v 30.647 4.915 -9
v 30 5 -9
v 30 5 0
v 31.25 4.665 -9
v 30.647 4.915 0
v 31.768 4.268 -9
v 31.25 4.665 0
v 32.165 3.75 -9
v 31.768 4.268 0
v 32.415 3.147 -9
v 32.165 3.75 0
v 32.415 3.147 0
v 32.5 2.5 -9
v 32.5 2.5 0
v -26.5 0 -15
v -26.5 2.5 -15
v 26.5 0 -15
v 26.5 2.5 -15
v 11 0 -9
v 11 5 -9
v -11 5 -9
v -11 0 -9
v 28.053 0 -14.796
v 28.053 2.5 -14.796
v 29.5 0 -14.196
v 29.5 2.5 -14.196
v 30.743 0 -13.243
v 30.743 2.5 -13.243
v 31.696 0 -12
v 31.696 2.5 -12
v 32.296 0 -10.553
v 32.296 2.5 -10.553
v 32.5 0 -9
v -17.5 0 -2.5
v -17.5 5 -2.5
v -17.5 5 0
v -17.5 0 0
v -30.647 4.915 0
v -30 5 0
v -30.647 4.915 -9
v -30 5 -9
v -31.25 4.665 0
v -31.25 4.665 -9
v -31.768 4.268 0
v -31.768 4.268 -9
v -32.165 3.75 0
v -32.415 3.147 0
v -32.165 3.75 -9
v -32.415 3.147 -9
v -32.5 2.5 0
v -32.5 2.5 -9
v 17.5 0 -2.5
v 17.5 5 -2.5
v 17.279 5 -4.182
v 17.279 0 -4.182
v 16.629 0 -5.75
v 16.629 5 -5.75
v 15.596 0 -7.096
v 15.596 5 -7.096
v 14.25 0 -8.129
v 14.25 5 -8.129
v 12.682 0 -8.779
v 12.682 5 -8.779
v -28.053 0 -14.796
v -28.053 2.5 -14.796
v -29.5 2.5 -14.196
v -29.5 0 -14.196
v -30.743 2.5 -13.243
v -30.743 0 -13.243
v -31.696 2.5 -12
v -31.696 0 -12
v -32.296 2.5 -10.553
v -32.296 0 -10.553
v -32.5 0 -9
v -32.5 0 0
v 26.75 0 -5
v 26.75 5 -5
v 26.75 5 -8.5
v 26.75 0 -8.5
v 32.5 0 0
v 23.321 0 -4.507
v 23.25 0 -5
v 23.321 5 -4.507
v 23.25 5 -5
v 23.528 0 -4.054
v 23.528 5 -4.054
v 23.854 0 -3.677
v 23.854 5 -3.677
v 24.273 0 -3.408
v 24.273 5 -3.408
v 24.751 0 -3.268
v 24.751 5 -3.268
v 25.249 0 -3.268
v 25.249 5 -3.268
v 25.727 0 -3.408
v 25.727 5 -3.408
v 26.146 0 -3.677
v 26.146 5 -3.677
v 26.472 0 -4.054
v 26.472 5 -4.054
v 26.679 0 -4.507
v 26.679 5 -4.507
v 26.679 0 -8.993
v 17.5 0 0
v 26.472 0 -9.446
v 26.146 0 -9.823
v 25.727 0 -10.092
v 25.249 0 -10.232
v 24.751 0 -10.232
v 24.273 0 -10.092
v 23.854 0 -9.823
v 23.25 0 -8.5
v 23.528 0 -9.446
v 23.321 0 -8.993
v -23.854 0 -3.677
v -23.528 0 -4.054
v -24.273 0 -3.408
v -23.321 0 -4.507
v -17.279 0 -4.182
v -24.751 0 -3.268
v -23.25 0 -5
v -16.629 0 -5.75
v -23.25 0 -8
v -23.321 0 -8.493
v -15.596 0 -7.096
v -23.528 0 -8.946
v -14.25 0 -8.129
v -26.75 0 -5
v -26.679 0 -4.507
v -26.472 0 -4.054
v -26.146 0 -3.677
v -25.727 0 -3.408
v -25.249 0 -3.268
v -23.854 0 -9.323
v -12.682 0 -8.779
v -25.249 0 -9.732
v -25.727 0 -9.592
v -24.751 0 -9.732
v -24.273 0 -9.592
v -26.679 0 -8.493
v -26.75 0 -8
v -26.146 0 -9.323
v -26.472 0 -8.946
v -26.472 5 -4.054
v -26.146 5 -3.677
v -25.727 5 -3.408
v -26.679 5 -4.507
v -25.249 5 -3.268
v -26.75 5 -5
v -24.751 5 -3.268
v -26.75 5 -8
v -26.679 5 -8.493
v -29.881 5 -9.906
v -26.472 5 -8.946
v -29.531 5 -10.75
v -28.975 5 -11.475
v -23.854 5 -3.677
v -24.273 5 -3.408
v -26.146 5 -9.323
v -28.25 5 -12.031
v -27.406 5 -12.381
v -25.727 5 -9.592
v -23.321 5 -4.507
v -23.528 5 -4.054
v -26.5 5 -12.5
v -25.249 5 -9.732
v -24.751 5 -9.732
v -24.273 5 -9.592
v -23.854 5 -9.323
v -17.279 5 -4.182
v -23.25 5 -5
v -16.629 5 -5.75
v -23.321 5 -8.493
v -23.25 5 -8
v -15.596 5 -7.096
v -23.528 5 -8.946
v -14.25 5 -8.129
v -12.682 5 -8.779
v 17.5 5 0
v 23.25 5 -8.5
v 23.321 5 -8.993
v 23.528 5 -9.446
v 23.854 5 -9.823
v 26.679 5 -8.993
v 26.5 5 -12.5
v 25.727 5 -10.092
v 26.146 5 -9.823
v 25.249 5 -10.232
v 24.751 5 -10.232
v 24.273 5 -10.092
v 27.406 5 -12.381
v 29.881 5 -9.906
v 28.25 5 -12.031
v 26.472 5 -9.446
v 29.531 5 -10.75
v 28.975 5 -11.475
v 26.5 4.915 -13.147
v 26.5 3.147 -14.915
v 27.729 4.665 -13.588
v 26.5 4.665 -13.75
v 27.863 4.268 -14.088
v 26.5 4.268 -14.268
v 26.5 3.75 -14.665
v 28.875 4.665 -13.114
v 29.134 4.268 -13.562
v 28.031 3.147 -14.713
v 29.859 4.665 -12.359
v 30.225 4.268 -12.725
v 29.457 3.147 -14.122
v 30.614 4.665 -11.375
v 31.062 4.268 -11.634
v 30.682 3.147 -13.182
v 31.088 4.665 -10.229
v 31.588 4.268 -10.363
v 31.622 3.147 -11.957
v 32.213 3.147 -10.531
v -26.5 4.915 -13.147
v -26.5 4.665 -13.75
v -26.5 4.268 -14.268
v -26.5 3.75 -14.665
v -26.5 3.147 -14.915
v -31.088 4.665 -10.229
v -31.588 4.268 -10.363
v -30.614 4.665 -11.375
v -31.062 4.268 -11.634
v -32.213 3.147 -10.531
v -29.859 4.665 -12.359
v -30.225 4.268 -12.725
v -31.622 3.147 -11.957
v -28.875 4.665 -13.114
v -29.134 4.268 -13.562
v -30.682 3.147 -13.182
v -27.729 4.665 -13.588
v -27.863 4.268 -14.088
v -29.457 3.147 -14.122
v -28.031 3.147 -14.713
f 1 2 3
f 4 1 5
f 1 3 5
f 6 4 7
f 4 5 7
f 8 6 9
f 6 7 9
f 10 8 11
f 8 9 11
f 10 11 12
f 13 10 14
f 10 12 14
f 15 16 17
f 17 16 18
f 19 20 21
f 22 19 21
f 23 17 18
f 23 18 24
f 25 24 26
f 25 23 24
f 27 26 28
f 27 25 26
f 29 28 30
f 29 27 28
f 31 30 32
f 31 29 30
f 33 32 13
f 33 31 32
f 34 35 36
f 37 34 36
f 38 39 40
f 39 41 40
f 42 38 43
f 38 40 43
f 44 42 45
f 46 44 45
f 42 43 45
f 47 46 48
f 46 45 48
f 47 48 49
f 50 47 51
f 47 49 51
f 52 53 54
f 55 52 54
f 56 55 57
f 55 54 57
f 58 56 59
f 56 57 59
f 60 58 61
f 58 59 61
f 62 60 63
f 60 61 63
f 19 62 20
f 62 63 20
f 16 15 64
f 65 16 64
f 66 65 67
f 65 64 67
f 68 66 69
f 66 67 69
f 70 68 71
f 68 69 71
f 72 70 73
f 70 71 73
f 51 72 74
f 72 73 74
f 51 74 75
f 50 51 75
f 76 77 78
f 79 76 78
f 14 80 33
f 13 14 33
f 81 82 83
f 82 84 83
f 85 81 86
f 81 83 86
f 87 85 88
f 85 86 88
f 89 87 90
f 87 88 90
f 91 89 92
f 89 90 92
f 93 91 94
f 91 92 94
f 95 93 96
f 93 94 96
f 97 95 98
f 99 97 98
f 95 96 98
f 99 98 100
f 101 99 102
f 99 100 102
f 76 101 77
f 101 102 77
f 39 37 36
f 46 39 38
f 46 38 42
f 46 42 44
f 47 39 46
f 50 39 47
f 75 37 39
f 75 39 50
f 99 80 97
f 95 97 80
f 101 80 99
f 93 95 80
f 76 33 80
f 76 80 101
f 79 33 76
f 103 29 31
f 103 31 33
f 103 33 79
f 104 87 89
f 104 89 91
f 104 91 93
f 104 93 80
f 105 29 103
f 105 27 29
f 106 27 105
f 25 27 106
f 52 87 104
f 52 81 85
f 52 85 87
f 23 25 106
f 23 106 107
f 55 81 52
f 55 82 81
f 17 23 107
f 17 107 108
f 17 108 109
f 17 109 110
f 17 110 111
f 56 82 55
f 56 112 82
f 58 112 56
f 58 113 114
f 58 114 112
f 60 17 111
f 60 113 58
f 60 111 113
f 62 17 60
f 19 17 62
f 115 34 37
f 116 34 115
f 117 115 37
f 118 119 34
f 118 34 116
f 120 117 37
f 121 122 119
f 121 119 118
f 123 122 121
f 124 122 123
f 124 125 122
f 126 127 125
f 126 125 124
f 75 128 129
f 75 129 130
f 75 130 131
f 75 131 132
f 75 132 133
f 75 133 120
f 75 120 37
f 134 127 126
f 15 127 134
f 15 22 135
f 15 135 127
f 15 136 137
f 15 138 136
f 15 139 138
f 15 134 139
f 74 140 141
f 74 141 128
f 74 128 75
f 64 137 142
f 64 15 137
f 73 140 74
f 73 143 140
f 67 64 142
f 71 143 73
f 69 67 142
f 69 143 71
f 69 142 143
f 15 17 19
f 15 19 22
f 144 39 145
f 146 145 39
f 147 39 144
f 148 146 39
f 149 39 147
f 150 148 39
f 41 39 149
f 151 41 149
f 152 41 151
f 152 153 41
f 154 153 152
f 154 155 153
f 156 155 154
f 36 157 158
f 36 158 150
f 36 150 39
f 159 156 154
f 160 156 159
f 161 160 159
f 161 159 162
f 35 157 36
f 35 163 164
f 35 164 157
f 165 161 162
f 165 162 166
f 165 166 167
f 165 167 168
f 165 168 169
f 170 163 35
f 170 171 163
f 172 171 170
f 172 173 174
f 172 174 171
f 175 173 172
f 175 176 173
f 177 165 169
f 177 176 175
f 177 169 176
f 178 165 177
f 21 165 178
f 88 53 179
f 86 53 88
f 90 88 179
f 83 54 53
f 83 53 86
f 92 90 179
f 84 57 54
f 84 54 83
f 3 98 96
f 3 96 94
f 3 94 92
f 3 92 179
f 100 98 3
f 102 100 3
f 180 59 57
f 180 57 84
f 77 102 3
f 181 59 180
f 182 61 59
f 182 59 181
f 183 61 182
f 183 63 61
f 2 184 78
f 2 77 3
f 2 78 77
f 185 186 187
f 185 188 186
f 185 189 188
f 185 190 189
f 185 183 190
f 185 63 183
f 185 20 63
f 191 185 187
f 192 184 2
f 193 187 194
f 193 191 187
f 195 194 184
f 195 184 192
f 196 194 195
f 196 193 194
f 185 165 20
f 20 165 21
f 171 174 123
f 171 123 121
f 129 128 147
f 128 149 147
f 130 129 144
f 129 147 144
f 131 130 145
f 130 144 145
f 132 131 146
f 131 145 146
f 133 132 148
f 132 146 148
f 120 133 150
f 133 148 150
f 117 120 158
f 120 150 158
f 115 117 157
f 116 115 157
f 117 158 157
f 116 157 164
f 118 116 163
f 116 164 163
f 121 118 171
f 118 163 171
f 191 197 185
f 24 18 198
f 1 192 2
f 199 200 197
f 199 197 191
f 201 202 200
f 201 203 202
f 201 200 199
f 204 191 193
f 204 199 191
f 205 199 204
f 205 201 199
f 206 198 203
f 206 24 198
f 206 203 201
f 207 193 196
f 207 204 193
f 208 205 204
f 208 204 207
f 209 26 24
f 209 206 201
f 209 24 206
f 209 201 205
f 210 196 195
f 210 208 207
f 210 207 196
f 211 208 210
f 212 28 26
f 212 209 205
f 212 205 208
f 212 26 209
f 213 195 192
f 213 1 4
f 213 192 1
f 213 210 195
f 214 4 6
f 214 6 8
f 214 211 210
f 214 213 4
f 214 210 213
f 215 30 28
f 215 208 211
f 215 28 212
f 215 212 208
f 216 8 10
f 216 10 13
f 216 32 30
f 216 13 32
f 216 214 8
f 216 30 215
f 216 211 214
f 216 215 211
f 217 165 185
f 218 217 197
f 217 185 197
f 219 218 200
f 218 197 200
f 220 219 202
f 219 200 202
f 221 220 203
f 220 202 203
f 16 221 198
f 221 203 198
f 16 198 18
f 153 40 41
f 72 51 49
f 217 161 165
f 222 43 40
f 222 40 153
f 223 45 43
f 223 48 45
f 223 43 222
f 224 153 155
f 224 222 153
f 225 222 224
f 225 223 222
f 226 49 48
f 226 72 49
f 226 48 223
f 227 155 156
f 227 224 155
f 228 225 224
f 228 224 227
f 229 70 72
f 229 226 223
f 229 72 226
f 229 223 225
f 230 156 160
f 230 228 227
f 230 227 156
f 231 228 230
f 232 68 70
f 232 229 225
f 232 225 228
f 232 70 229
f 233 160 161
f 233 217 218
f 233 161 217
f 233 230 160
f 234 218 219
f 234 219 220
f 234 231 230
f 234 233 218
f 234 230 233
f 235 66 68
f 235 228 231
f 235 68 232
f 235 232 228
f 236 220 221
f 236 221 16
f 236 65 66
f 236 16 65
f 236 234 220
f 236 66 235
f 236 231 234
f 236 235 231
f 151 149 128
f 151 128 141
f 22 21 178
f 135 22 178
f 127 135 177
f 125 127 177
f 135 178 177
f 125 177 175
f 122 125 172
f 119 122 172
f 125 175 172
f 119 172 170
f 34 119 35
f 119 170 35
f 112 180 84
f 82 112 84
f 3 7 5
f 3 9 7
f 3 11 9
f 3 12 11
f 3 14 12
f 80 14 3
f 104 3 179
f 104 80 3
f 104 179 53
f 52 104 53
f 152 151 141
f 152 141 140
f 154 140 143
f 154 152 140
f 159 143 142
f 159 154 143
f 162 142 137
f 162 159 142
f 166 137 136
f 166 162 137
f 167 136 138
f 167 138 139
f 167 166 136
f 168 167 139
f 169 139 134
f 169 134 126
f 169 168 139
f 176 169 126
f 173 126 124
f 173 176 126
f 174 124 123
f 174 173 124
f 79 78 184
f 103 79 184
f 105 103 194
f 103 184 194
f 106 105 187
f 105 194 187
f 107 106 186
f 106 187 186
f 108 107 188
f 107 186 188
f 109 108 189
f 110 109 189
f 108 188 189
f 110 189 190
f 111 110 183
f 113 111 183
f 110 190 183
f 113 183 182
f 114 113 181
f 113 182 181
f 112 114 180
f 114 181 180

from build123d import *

# Parameters (mm, degrees)
BOSS_EXTRUDE1_DEPTH = 5
SKETCH4_R           = 1.75
CUT_EXTRUDE1_DEPTH  = 5
CUT_EXTRUDE2_DEPTH  = 5
SKETCH6_R           = 1.75
BOSS_EXTRUDE2_DEPTH = 5
SKETCH7_W           = 65
SKETCH7_H           = 7
CUT_EXTRUDE3_DEPTH  = 10
FILLET1_R           = 6
FILLET2_R           = 2.5


with BuildPart() as part:
    # Sketch3 → Boss-Extrude1 (new body)
    with BuildSketch(Plane(origin=(0, 0, 0), x_dir=(1, 0, 0), z_dir=(0, 1, 0))):
        Polygon((-32.5, 12), (-32.5, 22), (-22.5, 22), (22.5, 22), (32.5, 22), (32.5, 12), (32.5, 0), (-32.5, 0), align=None)
    extrude(amount=BOSS_EXTRUDE1_DEPTH)

    # Sketch4 → Cut-Extrude1 (cut)
    with BuildSketch(Plane(origin=(0, 5, 0), x_dir=(1, 0, 0), z_dir=(0, 1, 0))):
        with Locations(Location((-25, 5, 0), (0, 0, 270))):
            Circle(SKETCH4_R)
        with Locations(Location((0, 15.5, 0), (0, 0, 270))):
            Circle(SKETCH4_R)
        with Locations(Location((25, 5, 0), (0, 0, 270))):
            Circle(SKETCH4_R)
        with BuildLine():
            Line((-17.5, 0), (17.5, 0))
            Line((17.5, 0), (17.5, 2.5))
            ThreePointArc((17.5, 2.5), (15.596194078, 7.096194078), (11, 9))
            Line((11, 9), (-11, 9))
            ThreePointArc((-11, 9), (-15.596194078, 7.096194078), (-17.5, 2.5))
            Line((-17.5, 2.5), (-17.5, 0))
        make_face()
    extrude(amount=-CUT_EXTRUDE1_DEPTH, mode=Mode.SUBTRACT)

    # Sketch5 → Cut-Extrude2 (cut)
    with BuildSketch(Plane(origin=(0, 5, 0), x_dir=(1, 0, 0), z_dir=(0, 1, 0))):
        with BuildLine():
            Line((-26.75, 5), (-26.75, 8))
            ThreePointArc((-26.75, 8), (-25, 9.75), (-23.25, 8))
            Line((-23.25, 8), (-23.25, 5))
            Line((-23.25, 5), (-26.75, 5))
        make_face()
        with BuildLine():
            Line((23.25, 5), (26.75, 5))
            Line((26.75, 5), (26.75, 8.5))
            ThreePointArc((26.75, 8.5), (25, 10.25), (23.25, 8.5))
            Line((23.25, 8.5), (23.25, 5))
        make_face()
    extrude(amount=-CUT_EXTRUDE2_DEPTH, mode=Mode.SUBTRACT)

    # Sketch6 → Boss-Extrude2 (add)
    with BuildSketch(Plane(origin=(0, 5, 0), x_dir=(1, 0, 0), z_dir=(0, 1, 0))):
        with Locations((0, 15.5)):
            Circle(SKETCH6_R)
    extrude(amount=-BOSS_EXTRUDE2_DEPTH)

    # Sketch7 → Cut-Extrude3 (cut)
    with BuildSketch(Plane(origin=(0, 5, 0), x_dir=(1, 0, 0), z_dir=(0, 1, 0))):
        with Locations((0, 18.5)):
            Rectangle(SKETCH7_W, SKETCH7_H)
    extrude(amount=-CUT_EXTRUDE3_DEPTH, mode=Mode.SUBTRACT)

    # Fillet1
    fillet1_edges = [part.edges().sort_by_distance(p)[0] for p in [
        (-32.5, 2.5, -15),
        (32.5, 2.5, -15),
    ]]
    fillet(fillet1_edges, radius=FILLET1_R)

    # Fillet2
    fillet2_edges = [part.edges().sort_by_distance(p)[0] for p in [
        (0, 5, -15),
        (-32.5, 5, -4.5),
        (-30.742640687, 5, -13.242640687),
        (30.742640687, 5, -13.242640687),
        (32.5, 5, -4.5),
    ]]
    fillet(fillet2_edges, radius=FILLET2_R)


solid = part.part
